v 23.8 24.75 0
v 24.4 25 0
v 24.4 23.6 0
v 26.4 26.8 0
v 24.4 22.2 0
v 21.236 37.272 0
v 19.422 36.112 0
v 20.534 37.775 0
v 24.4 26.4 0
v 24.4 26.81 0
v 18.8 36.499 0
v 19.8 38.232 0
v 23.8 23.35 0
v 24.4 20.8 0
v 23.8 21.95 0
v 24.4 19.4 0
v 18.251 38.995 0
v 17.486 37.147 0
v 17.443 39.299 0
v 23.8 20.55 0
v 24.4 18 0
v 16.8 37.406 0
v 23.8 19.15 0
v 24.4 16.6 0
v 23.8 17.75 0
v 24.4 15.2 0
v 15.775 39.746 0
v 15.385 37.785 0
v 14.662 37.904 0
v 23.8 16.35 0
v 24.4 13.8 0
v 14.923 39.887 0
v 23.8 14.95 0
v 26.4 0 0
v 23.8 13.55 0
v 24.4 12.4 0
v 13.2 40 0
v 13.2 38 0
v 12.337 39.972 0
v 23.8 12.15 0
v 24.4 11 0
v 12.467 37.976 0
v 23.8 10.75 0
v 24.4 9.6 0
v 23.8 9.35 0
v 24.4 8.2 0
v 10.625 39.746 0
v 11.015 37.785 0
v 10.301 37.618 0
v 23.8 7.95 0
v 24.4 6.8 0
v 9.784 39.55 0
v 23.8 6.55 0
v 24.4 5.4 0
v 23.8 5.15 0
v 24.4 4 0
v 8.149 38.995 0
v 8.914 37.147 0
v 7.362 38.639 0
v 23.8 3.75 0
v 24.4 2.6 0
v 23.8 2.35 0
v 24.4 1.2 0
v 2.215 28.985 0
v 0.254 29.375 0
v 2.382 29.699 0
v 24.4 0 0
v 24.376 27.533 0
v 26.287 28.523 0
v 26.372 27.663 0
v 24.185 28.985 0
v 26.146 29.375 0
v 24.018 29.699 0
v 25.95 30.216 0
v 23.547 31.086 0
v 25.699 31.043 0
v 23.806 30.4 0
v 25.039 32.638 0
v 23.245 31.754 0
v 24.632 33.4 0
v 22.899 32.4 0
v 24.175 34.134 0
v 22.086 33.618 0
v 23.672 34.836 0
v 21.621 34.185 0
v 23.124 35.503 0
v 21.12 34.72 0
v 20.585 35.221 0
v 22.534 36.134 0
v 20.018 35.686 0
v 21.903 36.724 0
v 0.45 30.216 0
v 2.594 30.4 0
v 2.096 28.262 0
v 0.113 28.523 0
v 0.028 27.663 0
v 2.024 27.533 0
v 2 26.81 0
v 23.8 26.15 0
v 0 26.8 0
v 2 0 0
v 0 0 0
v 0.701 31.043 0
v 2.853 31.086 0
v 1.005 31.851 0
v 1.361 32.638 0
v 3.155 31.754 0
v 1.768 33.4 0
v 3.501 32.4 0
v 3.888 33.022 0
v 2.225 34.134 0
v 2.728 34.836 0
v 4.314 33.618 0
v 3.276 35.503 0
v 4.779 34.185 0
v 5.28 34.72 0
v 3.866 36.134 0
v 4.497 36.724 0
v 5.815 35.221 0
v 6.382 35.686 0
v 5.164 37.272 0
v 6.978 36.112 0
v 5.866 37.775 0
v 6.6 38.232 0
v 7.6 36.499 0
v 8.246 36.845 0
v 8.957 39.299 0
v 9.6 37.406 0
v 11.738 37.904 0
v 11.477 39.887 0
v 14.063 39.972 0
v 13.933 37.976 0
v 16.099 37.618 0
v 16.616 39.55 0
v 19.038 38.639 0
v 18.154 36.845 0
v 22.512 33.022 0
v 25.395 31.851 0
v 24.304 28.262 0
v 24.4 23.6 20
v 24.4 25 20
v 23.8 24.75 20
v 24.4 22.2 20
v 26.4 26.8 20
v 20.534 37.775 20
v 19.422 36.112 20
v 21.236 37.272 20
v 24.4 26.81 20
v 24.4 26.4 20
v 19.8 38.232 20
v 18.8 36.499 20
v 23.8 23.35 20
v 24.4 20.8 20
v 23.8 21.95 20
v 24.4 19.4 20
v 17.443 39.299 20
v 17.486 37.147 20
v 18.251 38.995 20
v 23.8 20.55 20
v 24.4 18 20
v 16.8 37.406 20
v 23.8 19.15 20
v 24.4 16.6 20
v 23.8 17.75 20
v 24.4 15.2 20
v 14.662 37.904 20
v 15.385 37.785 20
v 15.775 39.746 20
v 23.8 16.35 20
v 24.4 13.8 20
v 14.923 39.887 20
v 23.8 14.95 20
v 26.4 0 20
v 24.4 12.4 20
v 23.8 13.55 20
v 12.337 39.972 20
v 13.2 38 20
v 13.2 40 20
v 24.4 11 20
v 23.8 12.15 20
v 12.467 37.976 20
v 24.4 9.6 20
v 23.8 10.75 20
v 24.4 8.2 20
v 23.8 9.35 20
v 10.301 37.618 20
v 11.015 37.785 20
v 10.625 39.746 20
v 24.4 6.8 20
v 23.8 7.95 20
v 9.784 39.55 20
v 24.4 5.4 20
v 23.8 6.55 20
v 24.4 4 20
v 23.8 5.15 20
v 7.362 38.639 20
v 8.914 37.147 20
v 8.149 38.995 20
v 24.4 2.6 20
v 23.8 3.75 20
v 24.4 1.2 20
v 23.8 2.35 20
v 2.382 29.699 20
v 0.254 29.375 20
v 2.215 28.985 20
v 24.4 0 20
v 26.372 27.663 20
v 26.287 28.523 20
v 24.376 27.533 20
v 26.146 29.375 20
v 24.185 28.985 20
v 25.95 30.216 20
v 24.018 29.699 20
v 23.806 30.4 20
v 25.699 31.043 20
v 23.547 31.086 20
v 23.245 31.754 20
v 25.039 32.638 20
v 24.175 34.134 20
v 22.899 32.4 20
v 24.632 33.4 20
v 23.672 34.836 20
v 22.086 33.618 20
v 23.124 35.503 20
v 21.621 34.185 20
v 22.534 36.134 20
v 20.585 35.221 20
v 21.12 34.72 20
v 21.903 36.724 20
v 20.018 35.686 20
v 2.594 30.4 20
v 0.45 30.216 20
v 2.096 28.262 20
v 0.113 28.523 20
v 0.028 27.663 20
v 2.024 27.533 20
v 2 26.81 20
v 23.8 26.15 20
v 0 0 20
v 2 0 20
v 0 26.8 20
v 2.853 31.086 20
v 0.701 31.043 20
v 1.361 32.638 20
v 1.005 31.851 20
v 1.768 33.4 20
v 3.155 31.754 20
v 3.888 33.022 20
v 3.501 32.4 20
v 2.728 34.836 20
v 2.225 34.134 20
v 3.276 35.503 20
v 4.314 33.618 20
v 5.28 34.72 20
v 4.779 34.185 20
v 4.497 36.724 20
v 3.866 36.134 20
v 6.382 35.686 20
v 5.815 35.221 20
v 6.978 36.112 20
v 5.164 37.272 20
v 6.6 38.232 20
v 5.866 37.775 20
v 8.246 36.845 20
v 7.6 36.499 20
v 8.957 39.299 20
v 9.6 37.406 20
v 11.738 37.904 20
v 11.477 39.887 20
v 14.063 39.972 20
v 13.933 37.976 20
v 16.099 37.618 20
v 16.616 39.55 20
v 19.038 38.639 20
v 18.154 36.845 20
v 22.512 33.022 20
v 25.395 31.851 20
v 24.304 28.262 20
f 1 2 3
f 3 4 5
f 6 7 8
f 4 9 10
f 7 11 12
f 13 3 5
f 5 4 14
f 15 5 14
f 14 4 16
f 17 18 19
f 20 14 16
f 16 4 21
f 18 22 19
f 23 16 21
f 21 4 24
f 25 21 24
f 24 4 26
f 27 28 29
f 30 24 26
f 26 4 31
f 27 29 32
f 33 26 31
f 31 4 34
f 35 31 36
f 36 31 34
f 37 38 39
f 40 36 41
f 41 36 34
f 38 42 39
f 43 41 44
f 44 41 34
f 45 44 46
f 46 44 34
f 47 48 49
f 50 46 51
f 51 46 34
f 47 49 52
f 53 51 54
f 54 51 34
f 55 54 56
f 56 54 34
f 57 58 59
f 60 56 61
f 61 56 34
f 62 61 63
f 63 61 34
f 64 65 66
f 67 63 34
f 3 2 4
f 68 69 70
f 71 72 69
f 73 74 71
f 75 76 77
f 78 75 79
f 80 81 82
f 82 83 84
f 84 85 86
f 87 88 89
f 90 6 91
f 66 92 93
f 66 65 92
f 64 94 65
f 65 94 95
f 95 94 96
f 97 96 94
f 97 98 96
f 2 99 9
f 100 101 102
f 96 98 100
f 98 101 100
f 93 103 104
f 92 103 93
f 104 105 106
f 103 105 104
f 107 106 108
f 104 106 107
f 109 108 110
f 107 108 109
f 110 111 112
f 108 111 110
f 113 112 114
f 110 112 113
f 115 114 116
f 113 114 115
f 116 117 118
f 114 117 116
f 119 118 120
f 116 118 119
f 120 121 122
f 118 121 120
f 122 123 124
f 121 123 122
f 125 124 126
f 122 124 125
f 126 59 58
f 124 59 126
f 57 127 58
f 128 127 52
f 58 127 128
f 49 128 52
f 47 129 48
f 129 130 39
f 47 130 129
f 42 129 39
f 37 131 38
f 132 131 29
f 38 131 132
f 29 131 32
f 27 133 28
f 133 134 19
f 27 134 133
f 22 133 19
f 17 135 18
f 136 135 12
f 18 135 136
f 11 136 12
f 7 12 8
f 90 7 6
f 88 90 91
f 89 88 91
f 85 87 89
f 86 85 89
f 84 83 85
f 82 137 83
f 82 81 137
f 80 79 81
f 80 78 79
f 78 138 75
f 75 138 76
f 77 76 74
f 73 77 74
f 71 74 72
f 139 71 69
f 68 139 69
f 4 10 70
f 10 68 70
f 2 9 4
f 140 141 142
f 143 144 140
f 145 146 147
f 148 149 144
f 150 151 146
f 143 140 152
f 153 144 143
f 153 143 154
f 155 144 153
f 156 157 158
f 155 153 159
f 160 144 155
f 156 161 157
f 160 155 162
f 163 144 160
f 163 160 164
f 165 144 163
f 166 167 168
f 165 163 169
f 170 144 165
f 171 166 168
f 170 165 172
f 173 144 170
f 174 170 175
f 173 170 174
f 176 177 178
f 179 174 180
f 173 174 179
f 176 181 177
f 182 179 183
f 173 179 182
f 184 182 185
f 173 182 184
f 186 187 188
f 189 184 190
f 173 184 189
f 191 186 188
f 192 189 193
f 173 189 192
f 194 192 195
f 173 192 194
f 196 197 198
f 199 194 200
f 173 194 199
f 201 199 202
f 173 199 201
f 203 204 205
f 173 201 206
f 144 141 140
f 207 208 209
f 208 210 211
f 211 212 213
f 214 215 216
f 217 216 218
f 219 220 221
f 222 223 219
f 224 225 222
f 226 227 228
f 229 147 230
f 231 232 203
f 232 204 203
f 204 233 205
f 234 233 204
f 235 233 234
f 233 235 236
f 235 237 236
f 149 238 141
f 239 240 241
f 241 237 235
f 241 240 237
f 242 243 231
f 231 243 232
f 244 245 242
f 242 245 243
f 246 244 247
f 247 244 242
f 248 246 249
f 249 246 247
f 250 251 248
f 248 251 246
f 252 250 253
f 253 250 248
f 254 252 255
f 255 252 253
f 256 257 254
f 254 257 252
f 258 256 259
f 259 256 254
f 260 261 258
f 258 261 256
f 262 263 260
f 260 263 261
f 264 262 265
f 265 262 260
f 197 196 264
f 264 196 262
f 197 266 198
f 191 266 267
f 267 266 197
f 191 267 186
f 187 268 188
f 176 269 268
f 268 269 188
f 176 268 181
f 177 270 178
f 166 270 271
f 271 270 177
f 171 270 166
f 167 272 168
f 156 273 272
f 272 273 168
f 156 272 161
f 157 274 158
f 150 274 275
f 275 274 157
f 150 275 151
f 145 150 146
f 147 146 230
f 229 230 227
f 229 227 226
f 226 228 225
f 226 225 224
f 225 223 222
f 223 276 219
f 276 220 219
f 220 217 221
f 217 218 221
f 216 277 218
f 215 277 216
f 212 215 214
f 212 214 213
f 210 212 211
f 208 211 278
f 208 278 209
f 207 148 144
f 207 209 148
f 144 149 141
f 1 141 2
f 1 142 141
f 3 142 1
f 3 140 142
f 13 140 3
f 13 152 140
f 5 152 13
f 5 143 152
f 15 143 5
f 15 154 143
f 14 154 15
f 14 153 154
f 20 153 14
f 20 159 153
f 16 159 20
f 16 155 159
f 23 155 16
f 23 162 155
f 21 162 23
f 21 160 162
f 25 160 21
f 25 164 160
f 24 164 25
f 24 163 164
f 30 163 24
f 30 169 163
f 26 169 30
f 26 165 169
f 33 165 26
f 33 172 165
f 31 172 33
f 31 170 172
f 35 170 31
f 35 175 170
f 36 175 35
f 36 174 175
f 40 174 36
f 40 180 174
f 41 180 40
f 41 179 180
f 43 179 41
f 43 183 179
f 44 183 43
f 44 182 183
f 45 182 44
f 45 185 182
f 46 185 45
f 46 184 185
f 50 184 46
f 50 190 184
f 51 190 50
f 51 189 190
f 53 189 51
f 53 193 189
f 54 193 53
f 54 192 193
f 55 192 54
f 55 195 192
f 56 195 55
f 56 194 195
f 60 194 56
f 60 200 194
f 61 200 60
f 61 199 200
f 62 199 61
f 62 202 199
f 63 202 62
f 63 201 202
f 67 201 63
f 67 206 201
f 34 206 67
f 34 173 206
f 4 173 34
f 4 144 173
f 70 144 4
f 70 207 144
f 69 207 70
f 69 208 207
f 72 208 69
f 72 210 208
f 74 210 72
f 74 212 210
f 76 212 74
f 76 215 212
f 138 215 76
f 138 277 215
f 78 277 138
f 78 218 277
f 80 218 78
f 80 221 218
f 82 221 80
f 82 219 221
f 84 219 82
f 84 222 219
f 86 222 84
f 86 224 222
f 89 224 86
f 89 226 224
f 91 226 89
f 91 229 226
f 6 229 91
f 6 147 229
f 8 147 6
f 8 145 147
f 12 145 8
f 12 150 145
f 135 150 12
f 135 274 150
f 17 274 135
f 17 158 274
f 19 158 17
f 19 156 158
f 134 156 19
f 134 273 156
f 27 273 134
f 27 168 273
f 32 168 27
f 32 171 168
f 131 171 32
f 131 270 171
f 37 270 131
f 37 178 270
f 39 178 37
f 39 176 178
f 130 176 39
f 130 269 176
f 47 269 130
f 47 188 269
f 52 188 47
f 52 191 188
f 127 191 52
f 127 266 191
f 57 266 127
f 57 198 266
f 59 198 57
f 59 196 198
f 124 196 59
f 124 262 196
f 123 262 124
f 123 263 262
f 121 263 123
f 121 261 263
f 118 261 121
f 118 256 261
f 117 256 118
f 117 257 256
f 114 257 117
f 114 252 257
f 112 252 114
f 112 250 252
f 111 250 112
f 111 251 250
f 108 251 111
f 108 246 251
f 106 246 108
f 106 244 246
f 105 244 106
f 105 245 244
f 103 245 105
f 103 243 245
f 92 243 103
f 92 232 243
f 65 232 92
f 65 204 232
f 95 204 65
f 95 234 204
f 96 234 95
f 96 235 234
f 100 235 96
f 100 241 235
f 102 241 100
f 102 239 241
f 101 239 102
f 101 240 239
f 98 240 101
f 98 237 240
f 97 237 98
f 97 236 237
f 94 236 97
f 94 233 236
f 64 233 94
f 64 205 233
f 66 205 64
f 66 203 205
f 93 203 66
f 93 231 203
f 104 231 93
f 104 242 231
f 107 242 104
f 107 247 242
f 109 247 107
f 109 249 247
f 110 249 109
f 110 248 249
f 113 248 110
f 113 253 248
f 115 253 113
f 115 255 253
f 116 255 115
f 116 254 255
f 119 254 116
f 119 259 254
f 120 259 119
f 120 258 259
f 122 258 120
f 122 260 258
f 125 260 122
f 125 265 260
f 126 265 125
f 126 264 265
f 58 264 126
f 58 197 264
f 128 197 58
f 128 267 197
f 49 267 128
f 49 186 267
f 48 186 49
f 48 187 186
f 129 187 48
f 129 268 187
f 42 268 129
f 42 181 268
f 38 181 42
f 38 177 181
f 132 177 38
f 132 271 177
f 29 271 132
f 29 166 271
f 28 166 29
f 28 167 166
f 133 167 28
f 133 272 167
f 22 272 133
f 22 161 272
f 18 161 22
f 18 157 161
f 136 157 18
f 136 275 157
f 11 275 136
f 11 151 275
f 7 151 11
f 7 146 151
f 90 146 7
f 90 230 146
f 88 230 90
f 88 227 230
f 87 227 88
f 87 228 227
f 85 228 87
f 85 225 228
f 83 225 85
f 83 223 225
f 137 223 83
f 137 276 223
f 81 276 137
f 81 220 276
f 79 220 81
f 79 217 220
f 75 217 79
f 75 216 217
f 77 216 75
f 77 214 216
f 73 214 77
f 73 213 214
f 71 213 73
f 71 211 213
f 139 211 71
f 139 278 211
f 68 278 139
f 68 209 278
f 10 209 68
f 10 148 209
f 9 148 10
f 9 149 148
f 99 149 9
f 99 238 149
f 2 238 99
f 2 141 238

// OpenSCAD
// PETG-Bettklammer R01 - parametrischer CAD-Stand, Einheiten mm
$fn = 96;
width = 20.0;
wall = 2.0;
clear_depth = 22.4; // 20.0 Profil + 2.0 Filz + 0.4 technisches Montagespiel
overall_height = 40.0;
outer_depth = clear_depth + 2*wall;
outer_radius = outer_depth/2;
inner_radius = outer_radius-wall;
bend_center_z = overall_height-outer_radius;
tooth_pitch = 1.4;
tooth_engagement = 0.6;
tooth_count = 18;
tooth_start_z = 1.2;

module cross_section() {
  difference() {
    union() {
      square([outer_depth, bend_center_z]);
      translate([outer_depth/2, bend_center_z]) circle(r=outer_radius);
    }
    union() {
      translate([wall, 0]) square([clear_depth, bend_center_z+0.01]);
      translate([outer_depth/2, bend_center_z]) circle(r=inner_radius);
      translate([-outer_depth, -outer_radius]) square([3*outer_depth, outer_radius]);
    }
  }
  // Flache Rampe in Aufschieberichtung; kurze Flanke greift gegen Abziehen.
  for (i=[0:tooth_count-1]) {
    z0 = tooth_start_z + i*tooth_pitch;
    polygon([[wall+clear_depth,z0],
             [wall+clear_depth-tooth_engagement,z0+tooth_pitch-0.25],
             [wall+clear_depth,z0+tooth_pitch]]);
  }
}

linear_extrude(height=width, convexity=10) cross_section();
